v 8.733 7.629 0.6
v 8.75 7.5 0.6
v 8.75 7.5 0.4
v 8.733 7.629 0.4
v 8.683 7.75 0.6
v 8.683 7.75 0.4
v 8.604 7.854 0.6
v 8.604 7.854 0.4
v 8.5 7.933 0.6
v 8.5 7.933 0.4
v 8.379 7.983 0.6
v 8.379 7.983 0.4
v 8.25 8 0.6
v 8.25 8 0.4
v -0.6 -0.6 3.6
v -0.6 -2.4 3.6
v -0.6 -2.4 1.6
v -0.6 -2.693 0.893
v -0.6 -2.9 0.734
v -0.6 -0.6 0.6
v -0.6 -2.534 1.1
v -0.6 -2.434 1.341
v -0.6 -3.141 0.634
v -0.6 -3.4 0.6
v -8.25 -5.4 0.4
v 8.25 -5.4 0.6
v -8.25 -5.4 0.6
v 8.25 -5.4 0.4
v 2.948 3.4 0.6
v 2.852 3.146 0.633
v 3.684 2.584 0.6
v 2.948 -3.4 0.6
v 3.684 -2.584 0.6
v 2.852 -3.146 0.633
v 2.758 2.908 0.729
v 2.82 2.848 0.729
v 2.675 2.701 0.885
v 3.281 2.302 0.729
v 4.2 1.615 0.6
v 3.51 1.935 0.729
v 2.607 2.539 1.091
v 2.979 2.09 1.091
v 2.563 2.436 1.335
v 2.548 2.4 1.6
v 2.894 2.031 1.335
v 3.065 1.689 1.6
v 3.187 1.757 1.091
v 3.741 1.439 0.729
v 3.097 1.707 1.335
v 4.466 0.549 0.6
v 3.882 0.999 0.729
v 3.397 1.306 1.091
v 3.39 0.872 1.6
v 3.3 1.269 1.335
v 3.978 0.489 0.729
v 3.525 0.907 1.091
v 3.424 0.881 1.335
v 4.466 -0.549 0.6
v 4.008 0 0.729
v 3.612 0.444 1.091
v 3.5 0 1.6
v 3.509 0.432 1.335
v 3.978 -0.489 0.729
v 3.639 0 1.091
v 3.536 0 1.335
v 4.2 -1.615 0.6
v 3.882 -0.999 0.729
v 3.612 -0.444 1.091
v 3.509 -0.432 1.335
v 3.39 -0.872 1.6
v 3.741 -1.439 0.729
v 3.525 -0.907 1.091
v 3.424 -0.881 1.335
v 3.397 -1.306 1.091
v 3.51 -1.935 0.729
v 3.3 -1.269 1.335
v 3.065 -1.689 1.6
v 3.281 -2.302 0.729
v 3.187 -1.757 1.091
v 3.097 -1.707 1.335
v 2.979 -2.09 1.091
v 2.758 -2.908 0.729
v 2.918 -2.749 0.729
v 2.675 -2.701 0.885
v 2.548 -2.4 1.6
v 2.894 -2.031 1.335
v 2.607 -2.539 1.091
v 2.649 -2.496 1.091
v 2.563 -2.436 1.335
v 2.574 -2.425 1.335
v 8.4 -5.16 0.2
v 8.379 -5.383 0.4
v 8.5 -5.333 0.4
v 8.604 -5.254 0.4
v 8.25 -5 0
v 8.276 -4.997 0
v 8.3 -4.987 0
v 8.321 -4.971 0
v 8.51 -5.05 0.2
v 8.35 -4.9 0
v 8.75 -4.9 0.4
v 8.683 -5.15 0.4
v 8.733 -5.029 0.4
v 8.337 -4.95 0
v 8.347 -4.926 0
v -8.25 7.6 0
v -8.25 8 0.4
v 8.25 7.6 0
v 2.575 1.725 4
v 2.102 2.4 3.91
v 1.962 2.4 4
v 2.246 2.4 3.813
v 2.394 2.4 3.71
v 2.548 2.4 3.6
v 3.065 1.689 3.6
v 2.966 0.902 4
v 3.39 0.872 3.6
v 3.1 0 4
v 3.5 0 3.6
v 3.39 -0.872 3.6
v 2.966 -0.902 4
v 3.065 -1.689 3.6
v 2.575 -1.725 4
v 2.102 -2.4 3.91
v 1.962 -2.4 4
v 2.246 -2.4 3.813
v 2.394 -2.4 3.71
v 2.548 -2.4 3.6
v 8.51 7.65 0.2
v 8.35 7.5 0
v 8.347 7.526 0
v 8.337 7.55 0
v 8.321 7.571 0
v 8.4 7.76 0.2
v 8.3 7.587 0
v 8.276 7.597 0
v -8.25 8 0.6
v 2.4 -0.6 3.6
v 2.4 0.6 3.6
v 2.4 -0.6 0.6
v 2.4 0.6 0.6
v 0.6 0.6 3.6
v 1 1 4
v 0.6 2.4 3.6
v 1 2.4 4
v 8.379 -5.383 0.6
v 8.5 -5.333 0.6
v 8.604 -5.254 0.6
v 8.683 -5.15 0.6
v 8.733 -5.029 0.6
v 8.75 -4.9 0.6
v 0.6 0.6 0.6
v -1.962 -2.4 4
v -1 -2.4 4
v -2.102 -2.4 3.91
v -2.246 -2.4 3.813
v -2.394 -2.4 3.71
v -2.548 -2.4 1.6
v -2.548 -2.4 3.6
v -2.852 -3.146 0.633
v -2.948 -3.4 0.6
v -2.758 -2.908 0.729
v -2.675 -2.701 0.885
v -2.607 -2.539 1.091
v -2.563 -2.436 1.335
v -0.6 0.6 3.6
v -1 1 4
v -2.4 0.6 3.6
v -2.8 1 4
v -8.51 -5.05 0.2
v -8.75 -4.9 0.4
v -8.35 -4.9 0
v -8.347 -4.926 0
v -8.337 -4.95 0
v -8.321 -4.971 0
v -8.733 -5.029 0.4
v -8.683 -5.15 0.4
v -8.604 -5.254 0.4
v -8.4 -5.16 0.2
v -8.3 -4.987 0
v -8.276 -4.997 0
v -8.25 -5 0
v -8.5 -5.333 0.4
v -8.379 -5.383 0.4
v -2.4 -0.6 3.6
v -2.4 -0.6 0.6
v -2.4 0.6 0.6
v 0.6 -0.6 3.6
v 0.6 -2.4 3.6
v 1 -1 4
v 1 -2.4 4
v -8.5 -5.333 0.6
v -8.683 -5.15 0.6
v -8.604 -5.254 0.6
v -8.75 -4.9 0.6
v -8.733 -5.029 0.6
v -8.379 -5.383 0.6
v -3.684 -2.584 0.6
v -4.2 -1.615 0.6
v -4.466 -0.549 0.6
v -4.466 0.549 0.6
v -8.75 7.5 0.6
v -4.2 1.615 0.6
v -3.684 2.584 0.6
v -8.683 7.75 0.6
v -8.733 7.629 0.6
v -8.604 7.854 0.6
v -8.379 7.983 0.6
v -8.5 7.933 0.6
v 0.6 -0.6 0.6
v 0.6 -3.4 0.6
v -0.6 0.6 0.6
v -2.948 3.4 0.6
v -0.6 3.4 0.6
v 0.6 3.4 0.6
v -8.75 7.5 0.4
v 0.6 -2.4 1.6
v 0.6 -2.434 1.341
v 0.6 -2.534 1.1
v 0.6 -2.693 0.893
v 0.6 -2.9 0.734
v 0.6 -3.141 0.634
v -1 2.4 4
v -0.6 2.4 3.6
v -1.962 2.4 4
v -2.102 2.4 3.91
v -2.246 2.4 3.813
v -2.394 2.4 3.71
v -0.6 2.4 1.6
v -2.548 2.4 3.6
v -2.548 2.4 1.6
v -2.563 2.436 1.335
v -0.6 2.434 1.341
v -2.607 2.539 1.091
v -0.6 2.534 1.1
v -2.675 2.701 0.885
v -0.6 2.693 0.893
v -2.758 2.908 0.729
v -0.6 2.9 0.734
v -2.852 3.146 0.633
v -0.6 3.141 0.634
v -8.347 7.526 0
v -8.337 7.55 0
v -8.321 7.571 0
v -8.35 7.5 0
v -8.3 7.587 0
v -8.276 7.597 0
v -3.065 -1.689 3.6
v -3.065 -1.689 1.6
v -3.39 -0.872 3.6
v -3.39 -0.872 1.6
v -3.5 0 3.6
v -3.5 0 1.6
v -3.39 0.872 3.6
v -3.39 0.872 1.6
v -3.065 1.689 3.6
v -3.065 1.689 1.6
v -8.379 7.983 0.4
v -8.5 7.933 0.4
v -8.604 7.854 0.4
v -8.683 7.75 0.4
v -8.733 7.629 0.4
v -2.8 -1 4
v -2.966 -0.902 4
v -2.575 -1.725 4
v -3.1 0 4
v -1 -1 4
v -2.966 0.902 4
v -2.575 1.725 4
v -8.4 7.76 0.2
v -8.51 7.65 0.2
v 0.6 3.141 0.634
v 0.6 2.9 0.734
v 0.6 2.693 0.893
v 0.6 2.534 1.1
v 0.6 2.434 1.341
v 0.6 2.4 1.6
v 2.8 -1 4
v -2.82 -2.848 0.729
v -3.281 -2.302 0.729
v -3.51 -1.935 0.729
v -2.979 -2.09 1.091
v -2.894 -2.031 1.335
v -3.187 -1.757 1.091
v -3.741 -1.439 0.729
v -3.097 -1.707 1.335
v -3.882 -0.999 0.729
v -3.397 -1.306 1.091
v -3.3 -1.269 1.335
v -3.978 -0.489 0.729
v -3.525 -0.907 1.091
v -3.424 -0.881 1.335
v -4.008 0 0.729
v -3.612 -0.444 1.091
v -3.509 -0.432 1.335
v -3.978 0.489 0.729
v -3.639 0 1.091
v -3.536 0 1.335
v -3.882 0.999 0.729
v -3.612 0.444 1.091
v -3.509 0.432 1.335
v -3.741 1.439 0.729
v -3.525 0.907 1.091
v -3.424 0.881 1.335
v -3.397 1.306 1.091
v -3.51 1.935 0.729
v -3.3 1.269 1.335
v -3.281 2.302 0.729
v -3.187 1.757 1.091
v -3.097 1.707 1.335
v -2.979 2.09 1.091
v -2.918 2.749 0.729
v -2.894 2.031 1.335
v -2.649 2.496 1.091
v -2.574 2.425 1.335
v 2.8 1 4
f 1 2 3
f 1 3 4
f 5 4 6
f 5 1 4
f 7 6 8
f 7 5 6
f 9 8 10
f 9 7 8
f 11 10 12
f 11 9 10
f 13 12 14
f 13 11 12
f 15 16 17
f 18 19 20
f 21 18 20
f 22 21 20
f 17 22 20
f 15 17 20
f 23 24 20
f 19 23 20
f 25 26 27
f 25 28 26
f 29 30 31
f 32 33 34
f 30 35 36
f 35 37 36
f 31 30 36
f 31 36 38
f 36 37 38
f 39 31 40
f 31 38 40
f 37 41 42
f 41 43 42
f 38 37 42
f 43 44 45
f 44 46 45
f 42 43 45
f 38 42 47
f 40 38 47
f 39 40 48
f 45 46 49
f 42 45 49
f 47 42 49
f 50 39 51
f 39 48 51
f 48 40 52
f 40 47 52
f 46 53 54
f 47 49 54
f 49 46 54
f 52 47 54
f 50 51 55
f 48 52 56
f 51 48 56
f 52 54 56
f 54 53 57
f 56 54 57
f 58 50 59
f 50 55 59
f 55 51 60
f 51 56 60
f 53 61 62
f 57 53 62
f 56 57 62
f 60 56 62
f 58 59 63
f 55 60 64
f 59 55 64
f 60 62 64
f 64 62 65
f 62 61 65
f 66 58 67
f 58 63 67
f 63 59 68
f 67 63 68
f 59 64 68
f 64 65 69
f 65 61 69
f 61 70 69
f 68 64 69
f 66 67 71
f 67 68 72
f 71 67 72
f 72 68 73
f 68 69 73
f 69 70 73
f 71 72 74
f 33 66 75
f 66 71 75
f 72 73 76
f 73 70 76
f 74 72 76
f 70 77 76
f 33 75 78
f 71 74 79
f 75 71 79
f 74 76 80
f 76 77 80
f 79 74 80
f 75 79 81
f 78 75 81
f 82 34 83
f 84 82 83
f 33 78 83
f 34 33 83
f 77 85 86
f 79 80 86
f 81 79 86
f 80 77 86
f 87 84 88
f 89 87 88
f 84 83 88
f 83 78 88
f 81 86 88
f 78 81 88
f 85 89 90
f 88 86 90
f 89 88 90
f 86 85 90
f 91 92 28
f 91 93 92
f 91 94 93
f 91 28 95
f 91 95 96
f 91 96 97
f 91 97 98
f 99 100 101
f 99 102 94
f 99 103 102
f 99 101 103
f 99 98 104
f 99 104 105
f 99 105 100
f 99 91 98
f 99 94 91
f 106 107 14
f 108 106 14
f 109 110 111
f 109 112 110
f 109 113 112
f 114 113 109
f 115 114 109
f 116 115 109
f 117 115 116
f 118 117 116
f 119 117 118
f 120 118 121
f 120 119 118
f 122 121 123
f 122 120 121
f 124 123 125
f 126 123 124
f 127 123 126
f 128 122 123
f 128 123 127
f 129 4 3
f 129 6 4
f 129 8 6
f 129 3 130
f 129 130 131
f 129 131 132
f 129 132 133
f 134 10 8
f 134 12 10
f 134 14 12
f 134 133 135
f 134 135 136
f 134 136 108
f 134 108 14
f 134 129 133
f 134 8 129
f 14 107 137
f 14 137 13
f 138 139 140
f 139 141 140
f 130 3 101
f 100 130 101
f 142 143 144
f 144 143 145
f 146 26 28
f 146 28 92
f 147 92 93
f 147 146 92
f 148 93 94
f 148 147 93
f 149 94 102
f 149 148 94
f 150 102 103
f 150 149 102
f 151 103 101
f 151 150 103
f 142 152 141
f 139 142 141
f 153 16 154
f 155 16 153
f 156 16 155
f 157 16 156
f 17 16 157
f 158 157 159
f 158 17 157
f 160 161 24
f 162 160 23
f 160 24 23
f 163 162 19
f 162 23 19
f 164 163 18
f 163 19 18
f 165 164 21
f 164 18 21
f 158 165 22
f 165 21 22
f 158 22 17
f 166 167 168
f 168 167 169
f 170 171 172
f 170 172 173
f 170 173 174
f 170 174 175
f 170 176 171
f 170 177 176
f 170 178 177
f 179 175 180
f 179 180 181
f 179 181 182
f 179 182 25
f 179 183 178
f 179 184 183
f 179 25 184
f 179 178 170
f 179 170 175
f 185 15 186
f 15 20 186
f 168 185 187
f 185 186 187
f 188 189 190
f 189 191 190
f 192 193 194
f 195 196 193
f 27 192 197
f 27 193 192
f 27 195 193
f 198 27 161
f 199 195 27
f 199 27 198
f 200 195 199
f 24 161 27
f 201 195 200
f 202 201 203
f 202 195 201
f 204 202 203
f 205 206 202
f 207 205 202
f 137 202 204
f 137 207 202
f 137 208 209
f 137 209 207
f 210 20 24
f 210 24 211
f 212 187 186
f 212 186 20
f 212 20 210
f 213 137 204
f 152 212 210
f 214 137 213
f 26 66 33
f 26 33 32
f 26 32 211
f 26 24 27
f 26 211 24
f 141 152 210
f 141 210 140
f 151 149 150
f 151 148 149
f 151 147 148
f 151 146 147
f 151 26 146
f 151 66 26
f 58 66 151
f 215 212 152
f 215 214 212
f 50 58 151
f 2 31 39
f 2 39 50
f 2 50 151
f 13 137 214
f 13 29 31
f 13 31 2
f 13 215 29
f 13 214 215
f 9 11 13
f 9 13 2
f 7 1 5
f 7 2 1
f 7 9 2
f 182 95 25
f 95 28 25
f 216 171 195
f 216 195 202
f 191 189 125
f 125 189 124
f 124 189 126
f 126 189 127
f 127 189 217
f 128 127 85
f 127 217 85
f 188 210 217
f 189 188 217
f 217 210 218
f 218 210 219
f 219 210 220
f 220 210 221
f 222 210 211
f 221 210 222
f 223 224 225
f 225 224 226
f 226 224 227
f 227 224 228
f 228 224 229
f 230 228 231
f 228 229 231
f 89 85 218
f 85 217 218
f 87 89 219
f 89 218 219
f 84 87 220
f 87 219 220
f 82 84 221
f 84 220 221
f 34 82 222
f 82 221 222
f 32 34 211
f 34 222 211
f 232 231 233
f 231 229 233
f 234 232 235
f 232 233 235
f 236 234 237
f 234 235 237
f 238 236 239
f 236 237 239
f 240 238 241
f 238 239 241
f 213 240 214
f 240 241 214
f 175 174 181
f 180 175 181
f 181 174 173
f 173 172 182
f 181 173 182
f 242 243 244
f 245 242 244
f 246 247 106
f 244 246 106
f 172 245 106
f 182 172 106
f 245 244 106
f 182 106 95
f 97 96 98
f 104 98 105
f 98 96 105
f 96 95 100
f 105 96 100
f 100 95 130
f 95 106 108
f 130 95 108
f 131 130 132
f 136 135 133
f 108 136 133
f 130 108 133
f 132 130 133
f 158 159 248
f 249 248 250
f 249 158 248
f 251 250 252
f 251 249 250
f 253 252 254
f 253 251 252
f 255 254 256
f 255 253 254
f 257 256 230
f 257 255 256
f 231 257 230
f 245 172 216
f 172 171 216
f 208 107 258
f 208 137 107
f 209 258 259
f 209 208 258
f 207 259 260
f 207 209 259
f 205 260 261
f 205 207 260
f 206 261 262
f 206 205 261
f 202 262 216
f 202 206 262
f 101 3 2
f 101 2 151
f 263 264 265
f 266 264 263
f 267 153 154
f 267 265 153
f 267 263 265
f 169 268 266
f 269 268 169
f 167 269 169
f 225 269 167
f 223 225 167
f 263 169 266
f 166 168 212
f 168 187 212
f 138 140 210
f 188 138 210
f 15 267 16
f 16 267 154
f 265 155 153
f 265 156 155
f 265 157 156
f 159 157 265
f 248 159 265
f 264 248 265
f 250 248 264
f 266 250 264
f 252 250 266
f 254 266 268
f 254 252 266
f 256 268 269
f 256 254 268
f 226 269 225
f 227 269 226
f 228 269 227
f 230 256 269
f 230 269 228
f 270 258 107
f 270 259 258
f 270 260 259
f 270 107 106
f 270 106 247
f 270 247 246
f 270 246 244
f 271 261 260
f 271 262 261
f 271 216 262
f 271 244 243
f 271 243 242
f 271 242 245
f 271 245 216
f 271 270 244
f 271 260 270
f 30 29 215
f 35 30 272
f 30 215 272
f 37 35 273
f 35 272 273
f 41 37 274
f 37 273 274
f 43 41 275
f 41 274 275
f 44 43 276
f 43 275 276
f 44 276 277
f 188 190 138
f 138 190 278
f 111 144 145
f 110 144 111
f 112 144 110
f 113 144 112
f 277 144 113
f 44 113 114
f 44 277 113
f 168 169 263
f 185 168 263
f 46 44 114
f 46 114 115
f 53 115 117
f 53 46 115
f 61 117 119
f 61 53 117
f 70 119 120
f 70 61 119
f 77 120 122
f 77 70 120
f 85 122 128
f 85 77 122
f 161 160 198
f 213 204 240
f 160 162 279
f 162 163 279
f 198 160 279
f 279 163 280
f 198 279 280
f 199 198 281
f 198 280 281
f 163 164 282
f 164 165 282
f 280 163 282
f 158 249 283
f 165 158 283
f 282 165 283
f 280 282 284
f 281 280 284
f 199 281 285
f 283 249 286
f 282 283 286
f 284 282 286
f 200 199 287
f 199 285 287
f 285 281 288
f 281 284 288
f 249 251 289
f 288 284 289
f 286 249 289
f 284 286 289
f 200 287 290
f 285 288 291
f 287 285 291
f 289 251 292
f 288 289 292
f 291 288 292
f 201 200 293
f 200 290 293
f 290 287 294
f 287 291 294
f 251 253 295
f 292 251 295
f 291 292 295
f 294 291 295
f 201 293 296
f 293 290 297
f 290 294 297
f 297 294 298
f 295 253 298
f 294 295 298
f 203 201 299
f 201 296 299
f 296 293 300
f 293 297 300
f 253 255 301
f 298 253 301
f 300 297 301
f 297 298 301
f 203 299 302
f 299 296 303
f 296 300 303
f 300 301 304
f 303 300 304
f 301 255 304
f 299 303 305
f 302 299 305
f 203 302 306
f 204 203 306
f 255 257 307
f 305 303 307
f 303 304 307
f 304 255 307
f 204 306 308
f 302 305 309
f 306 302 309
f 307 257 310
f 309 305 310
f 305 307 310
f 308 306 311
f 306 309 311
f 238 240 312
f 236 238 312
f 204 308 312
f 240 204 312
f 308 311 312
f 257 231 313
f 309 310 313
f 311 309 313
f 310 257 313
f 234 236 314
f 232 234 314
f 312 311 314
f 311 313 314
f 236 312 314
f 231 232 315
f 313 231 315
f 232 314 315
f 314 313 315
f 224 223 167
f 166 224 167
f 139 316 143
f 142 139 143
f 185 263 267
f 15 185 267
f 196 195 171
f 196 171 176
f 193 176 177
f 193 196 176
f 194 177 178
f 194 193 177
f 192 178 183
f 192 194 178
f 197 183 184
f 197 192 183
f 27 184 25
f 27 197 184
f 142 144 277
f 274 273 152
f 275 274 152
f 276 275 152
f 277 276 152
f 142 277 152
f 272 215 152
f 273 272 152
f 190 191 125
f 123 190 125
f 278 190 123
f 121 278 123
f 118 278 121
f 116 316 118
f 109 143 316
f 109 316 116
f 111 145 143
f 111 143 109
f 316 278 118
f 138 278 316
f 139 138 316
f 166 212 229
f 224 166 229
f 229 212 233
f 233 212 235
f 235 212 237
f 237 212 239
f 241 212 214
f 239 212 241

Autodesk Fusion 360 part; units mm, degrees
sketch "Sketch1" plane through (0, 0, 0) normal (0, 0, 1) x (1, 0, 0)
  line L0 (11.35, 9) -> (-11.35, 9) construction
  line L1 (-11.35, 9) -> (-11.35, -9) construction
  line L2 (-11.35, -9) -> (11.35, -9) construction
  line L3 (11.35, -9) -> (11.35, 9) construction
  line L4 (11.35, 9) -> (-11.35, -9) construction
  line L5 (-11.35, 9) -> (11.35, -9) construction
  line L6 (-8.75, 8) -> (8.75, 8)
  line L7 (8.75, 8) -> (8.75, -5.4)
  line L8 (8.75, -5.4) -> (-8.75, -5.4)
  line L9 (-8.75, -5.4) -> (-8.75, 8)
  circle A0 centre (0, 0) radius 3.5
  line L10 (2.4, -0.6) -> (-2.4, -0.6)
  line L11 (-2.4, -0.6) -> (-2.4, 0.6)
  line L12 (-2.4, 0.6) -> (2.4, 0.6)
  line L13 (2.4, 0.6) -> (2.4, -0.6)
  line L14 (2.4, -0.6) -> (-2.4, 0.6) construction
  line L15 (-2.4, -0.6) -> (2.4, 0.6) construction
  line L16 (0.6, -2.4) -> (-0.6, -2.4)
  line L17 (-0.6, -2.4) -> (-0.6, 2.4)
  line L18 (-0.6, 2.4) -> (0.6, 2.4)
  line L19 (0.6, 2.4) -> (0.6, -2.4)
  line L20 (0.6, -2.4) -> (-0.6, 2.4) construction
  line L21 (-0.6, -2.4) -> (0.6, 2.4) construction
  line L22 (-0.6, 2.4) -> (-2.5475, 2.4)
  line L23 (0.6, 2.4) -> (2.5475, 2.4)
  line L24 (-0.6, -2.4) -> (-2.5475, -2.4)
  line L25 (0.6, -2.4) -> (2.5475, -2.4)
  dimension "d1" = 22.7
  dimension "d2" = 18
  dimension "d3" = 3.6
  dimension "d4" = 1
  dimension "d5" = 2.6
  dimension "d6" = 2.6
  dimension "d7" = 7
  dimension "d8" = 4.8
  dimension "d9" = 1.2
  dimension "d10" = 1.2
  dimension "d11" = 4.8
extrude "Extrude1" add sketch "Sketch1" along normal blind 0.6 contours L6 L7 L8 L9 | A0 L10 L12 L13 L19 L23 L25 | A0 L18 L22 L23 | A0 L16 L24 L25 | A0 L10 L11 L12 L17 L22 L24 | L12 L17 L18 L19 | L10 L16 L17 L19 | L10 L12 L17 L19 | L10 L12 L13 L19 | L10 L11 L12 L17
extrude "Extrude2" add sketch "Sketch1" along normal blind 4 contours A0 L10 L12 L13 L19 L23 L25 | A0 L10 L11 L12 L17 L22 L24
fillet "Fillet1" radius 1 6 edges at (-1.5738, -2.4, 0.6) (-3.5, 0, 0.6) (1.5738, -2.4, 0.6) (3.5, 0, 0.6) (1.5738, 2.4, 0.6) (-1.5738, 2.4, 0.6)
fillet "Fillet1" radius 0.5 4 edges at (8.75, 8, 0.3) (-8.75, 8, 0.3) (8.75, -5.4, 0.3) (-8.75, -5.4, 0.3)
chamfer "Chamfer1" distance 0.4 angle 45 20 edges at (-8.6036, 7.8536, 0) (0, 8, 0) (8.6036, 7.8536, 0) (8.75, 1.3, 0) (8.6036, -5.2536, 0) (0, -5.4, 0) (-8.6036, -5.2536, 0) (-8.75, 1.3, 0) (-0.6, 1.5, 4) (-1.5, 0.6, 4) (-2.4, 0, 4) (-1.5, -0.6, 4) (-0.6, -1.5, 4) (0.6, -1.5, 4) (1.5, -0.6, 4) (2.4, 0, 4) (1.5, 0.6, 4) (0.6, 1.5, 4) (3.5, 0, 4) (-3.5, 0, 4)
